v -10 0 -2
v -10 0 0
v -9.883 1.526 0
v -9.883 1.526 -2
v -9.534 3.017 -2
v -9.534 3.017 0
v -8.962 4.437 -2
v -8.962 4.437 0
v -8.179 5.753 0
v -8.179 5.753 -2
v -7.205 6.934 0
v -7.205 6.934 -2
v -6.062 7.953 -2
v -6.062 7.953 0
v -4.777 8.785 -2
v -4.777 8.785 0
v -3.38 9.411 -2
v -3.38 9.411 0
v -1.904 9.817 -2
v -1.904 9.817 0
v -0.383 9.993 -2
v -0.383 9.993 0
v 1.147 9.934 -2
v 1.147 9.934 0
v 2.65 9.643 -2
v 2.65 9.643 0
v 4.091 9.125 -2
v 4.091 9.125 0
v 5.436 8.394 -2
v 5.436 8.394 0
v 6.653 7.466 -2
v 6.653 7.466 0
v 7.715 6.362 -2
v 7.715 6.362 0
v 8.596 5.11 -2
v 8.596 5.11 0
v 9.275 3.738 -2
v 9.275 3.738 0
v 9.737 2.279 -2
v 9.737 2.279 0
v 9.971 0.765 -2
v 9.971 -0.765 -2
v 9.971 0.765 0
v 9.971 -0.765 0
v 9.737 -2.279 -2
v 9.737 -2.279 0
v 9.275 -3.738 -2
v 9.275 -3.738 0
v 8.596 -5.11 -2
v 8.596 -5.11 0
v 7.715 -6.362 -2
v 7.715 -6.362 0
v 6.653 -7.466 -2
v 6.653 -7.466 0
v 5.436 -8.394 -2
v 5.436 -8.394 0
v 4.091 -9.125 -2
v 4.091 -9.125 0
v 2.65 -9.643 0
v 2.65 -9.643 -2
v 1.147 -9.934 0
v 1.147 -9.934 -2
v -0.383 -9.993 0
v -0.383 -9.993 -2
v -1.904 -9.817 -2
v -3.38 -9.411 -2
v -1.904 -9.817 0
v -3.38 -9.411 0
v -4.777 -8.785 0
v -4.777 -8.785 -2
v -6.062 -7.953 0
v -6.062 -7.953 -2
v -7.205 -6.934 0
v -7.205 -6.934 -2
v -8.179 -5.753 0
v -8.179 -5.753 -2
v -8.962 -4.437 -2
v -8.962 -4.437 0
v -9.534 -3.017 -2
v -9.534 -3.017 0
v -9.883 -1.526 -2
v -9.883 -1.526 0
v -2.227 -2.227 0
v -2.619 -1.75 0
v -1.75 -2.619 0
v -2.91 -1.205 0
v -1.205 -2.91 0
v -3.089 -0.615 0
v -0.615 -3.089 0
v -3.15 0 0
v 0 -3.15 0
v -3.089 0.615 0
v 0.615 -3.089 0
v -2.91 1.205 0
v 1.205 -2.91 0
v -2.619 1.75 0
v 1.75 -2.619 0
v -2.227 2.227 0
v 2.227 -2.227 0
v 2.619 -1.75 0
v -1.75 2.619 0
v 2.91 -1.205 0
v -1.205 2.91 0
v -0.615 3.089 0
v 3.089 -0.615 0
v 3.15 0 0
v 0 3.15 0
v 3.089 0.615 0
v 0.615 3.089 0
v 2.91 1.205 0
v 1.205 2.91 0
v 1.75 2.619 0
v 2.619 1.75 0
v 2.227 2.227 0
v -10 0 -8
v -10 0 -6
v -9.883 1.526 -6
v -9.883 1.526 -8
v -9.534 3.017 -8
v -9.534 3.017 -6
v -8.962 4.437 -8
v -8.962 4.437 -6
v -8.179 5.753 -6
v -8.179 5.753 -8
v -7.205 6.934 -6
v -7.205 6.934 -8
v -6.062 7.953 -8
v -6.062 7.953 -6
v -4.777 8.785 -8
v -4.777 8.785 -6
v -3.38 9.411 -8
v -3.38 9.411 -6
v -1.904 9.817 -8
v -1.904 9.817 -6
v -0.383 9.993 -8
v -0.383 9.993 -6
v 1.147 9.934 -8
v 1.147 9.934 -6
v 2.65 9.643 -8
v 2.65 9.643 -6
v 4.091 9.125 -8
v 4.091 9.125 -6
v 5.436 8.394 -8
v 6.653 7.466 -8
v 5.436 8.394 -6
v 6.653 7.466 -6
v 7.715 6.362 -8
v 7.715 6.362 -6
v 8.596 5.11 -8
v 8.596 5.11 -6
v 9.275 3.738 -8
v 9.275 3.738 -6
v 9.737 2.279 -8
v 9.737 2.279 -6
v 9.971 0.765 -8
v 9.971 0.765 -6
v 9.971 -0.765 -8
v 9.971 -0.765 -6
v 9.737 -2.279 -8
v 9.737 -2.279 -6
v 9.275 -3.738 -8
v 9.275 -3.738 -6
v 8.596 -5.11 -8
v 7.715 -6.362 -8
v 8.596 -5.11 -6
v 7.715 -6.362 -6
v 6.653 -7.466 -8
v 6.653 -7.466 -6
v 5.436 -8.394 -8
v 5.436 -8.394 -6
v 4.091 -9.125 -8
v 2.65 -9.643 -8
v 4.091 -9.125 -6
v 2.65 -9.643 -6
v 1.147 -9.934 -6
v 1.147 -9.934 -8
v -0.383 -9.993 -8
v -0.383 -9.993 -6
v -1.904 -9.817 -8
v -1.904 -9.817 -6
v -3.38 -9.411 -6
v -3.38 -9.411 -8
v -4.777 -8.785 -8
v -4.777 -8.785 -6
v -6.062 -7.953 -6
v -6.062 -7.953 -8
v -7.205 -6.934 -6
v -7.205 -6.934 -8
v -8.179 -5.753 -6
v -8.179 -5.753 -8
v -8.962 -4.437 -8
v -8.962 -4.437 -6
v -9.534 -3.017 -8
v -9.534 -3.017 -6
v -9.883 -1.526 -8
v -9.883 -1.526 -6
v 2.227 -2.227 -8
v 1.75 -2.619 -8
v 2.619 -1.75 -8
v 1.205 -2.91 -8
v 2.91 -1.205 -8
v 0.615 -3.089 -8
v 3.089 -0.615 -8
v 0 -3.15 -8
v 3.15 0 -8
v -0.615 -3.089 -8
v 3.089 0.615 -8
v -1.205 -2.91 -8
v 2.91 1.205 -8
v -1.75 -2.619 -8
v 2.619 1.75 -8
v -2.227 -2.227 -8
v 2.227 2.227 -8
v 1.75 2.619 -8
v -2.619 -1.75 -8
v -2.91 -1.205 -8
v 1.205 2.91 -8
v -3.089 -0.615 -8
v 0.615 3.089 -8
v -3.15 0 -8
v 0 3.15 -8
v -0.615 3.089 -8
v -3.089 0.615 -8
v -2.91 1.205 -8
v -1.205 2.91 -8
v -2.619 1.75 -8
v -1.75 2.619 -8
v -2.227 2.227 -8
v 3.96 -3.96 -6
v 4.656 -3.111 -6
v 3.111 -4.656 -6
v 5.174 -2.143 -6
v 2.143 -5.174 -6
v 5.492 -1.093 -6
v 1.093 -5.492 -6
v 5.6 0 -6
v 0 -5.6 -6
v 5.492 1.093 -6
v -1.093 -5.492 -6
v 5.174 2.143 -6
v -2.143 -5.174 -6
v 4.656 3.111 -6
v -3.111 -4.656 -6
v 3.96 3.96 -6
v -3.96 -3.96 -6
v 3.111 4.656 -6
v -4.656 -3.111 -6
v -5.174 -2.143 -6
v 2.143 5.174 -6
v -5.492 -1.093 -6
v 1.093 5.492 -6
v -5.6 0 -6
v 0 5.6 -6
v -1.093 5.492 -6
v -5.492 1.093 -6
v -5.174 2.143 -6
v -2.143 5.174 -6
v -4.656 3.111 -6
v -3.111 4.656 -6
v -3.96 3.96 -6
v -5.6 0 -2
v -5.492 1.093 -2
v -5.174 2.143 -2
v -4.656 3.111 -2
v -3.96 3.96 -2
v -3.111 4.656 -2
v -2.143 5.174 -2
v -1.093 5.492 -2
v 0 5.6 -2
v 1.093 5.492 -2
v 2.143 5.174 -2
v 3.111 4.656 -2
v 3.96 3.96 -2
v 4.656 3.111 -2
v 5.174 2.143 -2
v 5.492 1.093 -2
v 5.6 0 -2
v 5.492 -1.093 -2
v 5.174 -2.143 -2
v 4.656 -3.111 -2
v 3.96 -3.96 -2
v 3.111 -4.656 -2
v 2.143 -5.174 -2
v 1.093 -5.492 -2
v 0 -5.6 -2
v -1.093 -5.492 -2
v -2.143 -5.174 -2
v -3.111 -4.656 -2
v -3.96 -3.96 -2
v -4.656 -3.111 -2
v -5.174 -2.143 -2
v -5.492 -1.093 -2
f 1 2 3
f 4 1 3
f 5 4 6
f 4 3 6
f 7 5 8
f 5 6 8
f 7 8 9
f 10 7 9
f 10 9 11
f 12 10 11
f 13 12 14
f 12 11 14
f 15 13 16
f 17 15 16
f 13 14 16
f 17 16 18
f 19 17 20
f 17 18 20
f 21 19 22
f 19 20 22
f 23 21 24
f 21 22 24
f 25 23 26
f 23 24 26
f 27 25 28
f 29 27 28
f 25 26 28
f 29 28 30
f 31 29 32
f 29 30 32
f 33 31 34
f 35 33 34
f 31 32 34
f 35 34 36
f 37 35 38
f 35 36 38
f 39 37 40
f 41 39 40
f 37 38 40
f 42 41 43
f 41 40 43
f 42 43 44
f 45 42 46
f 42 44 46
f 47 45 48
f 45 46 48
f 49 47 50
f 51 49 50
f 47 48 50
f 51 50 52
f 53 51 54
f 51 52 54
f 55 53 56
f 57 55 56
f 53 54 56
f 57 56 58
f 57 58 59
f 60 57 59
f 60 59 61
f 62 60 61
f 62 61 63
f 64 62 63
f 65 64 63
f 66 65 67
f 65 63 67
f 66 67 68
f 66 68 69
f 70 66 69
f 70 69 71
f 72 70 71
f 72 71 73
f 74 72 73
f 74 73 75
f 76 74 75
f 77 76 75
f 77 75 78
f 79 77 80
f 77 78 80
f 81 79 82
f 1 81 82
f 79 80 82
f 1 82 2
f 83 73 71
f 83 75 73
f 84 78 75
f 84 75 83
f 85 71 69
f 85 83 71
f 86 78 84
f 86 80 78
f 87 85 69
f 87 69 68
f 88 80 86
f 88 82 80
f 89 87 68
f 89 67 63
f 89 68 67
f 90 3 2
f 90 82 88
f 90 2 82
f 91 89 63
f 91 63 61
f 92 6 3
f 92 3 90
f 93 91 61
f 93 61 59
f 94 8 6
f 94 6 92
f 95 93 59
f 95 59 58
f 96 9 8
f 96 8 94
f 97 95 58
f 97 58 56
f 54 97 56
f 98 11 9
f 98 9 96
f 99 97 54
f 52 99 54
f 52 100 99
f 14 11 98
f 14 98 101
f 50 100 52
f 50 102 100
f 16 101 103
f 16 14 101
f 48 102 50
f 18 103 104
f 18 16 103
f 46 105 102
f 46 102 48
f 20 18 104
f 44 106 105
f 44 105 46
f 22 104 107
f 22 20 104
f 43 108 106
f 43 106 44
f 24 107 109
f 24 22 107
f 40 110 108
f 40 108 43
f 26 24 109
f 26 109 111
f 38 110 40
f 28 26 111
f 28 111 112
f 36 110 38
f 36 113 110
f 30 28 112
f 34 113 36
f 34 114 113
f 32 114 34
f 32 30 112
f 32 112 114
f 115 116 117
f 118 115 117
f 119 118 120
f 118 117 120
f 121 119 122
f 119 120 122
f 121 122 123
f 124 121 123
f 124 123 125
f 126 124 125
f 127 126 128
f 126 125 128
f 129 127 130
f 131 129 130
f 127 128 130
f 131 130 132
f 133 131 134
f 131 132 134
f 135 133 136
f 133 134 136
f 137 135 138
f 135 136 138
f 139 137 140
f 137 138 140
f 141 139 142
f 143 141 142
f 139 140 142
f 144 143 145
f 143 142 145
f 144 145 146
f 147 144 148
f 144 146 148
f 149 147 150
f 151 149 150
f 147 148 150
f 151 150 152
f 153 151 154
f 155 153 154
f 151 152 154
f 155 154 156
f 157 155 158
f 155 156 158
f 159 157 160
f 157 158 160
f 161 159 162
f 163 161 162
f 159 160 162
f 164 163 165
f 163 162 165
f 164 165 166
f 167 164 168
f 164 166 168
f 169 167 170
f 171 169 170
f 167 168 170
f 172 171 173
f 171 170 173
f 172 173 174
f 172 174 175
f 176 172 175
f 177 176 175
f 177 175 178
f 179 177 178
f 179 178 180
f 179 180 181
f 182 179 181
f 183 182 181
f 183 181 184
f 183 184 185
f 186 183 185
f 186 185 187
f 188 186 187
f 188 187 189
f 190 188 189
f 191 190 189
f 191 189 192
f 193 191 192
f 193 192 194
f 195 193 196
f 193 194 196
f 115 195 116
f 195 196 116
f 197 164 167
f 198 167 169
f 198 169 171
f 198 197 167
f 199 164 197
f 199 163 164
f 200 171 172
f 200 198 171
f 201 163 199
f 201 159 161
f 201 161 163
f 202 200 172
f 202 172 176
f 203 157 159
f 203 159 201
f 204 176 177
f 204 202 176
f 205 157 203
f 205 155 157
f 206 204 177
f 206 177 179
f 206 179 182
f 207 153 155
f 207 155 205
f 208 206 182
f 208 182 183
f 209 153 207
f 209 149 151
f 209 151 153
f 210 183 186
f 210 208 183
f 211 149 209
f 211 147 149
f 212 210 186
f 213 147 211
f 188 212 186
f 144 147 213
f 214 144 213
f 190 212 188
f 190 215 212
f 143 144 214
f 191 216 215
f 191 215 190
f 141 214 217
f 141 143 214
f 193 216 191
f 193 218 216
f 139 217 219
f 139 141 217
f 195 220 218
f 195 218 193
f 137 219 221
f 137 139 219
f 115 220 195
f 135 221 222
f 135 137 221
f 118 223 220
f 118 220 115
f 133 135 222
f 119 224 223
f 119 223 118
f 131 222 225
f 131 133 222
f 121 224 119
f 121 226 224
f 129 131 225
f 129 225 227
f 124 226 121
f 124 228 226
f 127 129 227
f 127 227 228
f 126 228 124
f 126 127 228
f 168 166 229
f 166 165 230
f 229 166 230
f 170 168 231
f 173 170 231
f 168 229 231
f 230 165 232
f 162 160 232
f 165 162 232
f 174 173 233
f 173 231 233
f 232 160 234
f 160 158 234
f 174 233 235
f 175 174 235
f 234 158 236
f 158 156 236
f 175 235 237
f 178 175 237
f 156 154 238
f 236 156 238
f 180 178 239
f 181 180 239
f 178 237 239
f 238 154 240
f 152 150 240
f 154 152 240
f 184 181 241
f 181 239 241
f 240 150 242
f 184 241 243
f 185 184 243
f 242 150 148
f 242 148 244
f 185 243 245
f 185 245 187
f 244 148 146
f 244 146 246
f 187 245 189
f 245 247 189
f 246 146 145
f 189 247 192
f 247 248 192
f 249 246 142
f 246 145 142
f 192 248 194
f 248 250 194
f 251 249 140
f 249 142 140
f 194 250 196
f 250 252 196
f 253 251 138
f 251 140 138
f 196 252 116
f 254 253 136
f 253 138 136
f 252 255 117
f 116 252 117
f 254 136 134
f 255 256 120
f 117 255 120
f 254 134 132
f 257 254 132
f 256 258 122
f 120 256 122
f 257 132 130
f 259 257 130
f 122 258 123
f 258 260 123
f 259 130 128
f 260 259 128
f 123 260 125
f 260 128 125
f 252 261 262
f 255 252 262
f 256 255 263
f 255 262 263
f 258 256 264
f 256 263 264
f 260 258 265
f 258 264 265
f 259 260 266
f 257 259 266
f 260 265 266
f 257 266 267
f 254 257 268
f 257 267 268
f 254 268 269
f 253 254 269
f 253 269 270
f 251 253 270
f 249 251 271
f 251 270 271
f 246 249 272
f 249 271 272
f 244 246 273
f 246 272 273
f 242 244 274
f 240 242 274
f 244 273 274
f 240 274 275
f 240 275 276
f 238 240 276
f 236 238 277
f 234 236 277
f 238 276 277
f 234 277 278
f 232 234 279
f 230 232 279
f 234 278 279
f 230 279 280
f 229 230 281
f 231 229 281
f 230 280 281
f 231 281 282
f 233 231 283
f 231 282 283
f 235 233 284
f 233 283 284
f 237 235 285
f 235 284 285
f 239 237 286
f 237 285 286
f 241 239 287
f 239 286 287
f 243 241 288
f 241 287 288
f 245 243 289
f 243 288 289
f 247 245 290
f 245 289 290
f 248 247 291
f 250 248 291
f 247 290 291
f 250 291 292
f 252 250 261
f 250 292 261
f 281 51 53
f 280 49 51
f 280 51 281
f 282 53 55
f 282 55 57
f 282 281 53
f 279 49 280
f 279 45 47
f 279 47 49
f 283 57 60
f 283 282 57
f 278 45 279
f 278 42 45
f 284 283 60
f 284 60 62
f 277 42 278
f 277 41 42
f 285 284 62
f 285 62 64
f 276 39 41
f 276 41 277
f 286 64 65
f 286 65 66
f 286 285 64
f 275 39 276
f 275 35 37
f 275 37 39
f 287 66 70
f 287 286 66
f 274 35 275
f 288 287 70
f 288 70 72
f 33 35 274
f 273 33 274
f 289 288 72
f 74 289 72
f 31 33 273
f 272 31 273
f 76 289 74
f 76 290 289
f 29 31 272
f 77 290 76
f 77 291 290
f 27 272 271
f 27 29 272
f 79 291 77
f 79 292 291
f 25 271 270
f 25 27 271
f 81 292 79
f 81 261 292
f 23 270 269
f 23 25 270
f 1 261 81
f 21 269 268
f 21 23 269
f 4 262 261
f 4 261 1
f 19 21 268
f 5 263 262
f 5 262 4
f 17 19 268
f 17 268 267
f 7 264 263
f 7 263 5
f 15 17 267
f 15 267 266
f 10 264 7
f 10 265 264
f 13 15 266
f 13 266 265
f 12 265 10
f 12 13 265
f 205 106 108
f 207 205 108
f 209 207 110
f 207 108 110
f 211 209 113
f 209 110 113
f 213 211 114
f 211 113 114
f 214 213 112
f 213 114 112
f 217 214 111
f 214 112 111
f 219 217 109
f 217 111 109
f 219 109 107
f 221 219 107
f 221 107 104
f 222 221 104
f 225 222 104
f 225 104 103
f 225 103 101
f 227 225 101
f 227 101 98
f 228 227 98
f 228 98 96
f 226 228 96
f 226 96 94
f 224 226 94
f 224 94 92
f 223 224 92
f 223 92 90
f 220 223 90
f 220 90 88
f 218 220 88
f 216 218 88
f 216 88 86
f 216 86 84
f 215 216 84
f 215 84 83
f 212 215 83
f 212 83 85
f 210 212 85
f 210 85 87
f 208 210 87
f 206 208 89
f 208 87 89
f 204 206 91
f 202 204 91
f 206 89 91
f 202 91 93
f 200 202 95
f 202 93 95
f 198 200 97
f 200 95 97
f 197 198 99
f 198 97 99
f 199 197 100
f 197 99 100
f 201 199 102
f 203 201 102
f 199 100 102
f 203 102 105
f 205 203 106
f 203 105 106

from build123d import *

# Parameters (mm, degrees)
BOSS_EXTRUDE1_DEPTH = 7
SKETCH2_R           = 1.35
CUT_EXTRUDE1_DEPTH  = 1.7
SKETCH3_R           = 10
BOSS_EXTRUDE2_DEPTH = 2
SKETCH4_R           = 5.6
BOSS_EXTRUDE3_DEPTH = 4
SKETCH5_R           = 10
BOSS_EXTRUDE4_DEPTH = 2
SKETCH6_R           = 3.15
CUT_EXTRUDE2_DEPTH  = 17.248076809
SKETCH7_R           = 17.649258726
CUT_EXTRUDE3_DEPTH  = 7


with BuildPart() as part:
    # Sketch1 → Boss-Extrude1 (new body)
    with BuildSketch(Plane.XY):
        with BuildLine():
            Line((-5, 0), (-5, -8))
            Line((-5, -8), (5, -8))
            Line((5, -8), (5, 0))
            ThreePointArc((5, 0), (0, 5), (-5, 0))
        make_face()
        with BuildLine():
            Line((-3.5, -6.3), (-3.5, -2.3))
            Line((-3.5, -2.3), (-1.926136028, -2.3))
            ThreePointArc((-1.926136028, -2.3), (-1.269171366, 2.718309041), (3, 0))
            ThreePointArc((3, 0), (2.718309041, -1.269171366), (1.926136028, -2.3))
            Line((1.926136028, -2.3), (3.5, -2.3))
            Line((3.5, -2.3), (3.5, -6.3))
            Line((3.5, -6.3), (-3.5, -6.3))
        make_face(mode=Mode.SUBTRACT)
    extrude(amount=BOSS_EXTRUDE1_DEPTH)

    # Sketch2 → Cut-Extrude1 (cut)
    with BuildSketch(Plane.XZ.offset(8)):
        with Locations(Location((0, 4, 0), (0, 0, 270))):
            Circle(SKETCH2_R)
    extrude(amount=-CUT_EXTRUDE1_DEPTH, mode=Mode.SUBTRACT)

    # Sketch3 → Boss-Extrude2 (add)
    with BuildSketch(Plane(origin=(0, 0, 0), x_dir=(-1, 0, 0), z_dir=(0, 0, -1))):
        Circle(SKETCH3_R)
    extrude(amount=BOSS_EXTRUDE2_DEPTH)

    # Sketch4 → Boss-Extrude3 (add)
    with BuildSketch(Plane(origin=(0, 0, -2), x_dir=(-1, 0, 0), z_dir=(0, 0, -1))):
        Circle(SKETCH4_R)
    extrude(amount=BOSS_EXTRUDE3_DEPTH)

    # Sketch5 → Boss-Extrude4 (add)
    with BuildSketch(Plane(origin=(0, 0, -6), x_dir=(-1, 0, 0), z_dir=(0, 0, -1))):
        Circle(SKETCH5_R)
    extrude(amount=BOSS_EXTRUDE4_DEPTH)

    # Sketch6 → Cut-Extrude2 (cut, through all)
    with BuildSketch(Plane.XY):
        Circle(SKETCH6_R)
    extrude(amount=-CUT_EXTRUDE2_DEPTH, mode=Mode.SUBTRACT)

    # Sketch7 → Cut-Extrude3 (cut)
    with BuildSketch(Plane.XY.offset(7)):
        Circle(SKETCH7_R)
    extrude(amount=-CUT_EXTRUDE3_DEPTH, mode=Mode.SUBTRACT)


solid = part.part
